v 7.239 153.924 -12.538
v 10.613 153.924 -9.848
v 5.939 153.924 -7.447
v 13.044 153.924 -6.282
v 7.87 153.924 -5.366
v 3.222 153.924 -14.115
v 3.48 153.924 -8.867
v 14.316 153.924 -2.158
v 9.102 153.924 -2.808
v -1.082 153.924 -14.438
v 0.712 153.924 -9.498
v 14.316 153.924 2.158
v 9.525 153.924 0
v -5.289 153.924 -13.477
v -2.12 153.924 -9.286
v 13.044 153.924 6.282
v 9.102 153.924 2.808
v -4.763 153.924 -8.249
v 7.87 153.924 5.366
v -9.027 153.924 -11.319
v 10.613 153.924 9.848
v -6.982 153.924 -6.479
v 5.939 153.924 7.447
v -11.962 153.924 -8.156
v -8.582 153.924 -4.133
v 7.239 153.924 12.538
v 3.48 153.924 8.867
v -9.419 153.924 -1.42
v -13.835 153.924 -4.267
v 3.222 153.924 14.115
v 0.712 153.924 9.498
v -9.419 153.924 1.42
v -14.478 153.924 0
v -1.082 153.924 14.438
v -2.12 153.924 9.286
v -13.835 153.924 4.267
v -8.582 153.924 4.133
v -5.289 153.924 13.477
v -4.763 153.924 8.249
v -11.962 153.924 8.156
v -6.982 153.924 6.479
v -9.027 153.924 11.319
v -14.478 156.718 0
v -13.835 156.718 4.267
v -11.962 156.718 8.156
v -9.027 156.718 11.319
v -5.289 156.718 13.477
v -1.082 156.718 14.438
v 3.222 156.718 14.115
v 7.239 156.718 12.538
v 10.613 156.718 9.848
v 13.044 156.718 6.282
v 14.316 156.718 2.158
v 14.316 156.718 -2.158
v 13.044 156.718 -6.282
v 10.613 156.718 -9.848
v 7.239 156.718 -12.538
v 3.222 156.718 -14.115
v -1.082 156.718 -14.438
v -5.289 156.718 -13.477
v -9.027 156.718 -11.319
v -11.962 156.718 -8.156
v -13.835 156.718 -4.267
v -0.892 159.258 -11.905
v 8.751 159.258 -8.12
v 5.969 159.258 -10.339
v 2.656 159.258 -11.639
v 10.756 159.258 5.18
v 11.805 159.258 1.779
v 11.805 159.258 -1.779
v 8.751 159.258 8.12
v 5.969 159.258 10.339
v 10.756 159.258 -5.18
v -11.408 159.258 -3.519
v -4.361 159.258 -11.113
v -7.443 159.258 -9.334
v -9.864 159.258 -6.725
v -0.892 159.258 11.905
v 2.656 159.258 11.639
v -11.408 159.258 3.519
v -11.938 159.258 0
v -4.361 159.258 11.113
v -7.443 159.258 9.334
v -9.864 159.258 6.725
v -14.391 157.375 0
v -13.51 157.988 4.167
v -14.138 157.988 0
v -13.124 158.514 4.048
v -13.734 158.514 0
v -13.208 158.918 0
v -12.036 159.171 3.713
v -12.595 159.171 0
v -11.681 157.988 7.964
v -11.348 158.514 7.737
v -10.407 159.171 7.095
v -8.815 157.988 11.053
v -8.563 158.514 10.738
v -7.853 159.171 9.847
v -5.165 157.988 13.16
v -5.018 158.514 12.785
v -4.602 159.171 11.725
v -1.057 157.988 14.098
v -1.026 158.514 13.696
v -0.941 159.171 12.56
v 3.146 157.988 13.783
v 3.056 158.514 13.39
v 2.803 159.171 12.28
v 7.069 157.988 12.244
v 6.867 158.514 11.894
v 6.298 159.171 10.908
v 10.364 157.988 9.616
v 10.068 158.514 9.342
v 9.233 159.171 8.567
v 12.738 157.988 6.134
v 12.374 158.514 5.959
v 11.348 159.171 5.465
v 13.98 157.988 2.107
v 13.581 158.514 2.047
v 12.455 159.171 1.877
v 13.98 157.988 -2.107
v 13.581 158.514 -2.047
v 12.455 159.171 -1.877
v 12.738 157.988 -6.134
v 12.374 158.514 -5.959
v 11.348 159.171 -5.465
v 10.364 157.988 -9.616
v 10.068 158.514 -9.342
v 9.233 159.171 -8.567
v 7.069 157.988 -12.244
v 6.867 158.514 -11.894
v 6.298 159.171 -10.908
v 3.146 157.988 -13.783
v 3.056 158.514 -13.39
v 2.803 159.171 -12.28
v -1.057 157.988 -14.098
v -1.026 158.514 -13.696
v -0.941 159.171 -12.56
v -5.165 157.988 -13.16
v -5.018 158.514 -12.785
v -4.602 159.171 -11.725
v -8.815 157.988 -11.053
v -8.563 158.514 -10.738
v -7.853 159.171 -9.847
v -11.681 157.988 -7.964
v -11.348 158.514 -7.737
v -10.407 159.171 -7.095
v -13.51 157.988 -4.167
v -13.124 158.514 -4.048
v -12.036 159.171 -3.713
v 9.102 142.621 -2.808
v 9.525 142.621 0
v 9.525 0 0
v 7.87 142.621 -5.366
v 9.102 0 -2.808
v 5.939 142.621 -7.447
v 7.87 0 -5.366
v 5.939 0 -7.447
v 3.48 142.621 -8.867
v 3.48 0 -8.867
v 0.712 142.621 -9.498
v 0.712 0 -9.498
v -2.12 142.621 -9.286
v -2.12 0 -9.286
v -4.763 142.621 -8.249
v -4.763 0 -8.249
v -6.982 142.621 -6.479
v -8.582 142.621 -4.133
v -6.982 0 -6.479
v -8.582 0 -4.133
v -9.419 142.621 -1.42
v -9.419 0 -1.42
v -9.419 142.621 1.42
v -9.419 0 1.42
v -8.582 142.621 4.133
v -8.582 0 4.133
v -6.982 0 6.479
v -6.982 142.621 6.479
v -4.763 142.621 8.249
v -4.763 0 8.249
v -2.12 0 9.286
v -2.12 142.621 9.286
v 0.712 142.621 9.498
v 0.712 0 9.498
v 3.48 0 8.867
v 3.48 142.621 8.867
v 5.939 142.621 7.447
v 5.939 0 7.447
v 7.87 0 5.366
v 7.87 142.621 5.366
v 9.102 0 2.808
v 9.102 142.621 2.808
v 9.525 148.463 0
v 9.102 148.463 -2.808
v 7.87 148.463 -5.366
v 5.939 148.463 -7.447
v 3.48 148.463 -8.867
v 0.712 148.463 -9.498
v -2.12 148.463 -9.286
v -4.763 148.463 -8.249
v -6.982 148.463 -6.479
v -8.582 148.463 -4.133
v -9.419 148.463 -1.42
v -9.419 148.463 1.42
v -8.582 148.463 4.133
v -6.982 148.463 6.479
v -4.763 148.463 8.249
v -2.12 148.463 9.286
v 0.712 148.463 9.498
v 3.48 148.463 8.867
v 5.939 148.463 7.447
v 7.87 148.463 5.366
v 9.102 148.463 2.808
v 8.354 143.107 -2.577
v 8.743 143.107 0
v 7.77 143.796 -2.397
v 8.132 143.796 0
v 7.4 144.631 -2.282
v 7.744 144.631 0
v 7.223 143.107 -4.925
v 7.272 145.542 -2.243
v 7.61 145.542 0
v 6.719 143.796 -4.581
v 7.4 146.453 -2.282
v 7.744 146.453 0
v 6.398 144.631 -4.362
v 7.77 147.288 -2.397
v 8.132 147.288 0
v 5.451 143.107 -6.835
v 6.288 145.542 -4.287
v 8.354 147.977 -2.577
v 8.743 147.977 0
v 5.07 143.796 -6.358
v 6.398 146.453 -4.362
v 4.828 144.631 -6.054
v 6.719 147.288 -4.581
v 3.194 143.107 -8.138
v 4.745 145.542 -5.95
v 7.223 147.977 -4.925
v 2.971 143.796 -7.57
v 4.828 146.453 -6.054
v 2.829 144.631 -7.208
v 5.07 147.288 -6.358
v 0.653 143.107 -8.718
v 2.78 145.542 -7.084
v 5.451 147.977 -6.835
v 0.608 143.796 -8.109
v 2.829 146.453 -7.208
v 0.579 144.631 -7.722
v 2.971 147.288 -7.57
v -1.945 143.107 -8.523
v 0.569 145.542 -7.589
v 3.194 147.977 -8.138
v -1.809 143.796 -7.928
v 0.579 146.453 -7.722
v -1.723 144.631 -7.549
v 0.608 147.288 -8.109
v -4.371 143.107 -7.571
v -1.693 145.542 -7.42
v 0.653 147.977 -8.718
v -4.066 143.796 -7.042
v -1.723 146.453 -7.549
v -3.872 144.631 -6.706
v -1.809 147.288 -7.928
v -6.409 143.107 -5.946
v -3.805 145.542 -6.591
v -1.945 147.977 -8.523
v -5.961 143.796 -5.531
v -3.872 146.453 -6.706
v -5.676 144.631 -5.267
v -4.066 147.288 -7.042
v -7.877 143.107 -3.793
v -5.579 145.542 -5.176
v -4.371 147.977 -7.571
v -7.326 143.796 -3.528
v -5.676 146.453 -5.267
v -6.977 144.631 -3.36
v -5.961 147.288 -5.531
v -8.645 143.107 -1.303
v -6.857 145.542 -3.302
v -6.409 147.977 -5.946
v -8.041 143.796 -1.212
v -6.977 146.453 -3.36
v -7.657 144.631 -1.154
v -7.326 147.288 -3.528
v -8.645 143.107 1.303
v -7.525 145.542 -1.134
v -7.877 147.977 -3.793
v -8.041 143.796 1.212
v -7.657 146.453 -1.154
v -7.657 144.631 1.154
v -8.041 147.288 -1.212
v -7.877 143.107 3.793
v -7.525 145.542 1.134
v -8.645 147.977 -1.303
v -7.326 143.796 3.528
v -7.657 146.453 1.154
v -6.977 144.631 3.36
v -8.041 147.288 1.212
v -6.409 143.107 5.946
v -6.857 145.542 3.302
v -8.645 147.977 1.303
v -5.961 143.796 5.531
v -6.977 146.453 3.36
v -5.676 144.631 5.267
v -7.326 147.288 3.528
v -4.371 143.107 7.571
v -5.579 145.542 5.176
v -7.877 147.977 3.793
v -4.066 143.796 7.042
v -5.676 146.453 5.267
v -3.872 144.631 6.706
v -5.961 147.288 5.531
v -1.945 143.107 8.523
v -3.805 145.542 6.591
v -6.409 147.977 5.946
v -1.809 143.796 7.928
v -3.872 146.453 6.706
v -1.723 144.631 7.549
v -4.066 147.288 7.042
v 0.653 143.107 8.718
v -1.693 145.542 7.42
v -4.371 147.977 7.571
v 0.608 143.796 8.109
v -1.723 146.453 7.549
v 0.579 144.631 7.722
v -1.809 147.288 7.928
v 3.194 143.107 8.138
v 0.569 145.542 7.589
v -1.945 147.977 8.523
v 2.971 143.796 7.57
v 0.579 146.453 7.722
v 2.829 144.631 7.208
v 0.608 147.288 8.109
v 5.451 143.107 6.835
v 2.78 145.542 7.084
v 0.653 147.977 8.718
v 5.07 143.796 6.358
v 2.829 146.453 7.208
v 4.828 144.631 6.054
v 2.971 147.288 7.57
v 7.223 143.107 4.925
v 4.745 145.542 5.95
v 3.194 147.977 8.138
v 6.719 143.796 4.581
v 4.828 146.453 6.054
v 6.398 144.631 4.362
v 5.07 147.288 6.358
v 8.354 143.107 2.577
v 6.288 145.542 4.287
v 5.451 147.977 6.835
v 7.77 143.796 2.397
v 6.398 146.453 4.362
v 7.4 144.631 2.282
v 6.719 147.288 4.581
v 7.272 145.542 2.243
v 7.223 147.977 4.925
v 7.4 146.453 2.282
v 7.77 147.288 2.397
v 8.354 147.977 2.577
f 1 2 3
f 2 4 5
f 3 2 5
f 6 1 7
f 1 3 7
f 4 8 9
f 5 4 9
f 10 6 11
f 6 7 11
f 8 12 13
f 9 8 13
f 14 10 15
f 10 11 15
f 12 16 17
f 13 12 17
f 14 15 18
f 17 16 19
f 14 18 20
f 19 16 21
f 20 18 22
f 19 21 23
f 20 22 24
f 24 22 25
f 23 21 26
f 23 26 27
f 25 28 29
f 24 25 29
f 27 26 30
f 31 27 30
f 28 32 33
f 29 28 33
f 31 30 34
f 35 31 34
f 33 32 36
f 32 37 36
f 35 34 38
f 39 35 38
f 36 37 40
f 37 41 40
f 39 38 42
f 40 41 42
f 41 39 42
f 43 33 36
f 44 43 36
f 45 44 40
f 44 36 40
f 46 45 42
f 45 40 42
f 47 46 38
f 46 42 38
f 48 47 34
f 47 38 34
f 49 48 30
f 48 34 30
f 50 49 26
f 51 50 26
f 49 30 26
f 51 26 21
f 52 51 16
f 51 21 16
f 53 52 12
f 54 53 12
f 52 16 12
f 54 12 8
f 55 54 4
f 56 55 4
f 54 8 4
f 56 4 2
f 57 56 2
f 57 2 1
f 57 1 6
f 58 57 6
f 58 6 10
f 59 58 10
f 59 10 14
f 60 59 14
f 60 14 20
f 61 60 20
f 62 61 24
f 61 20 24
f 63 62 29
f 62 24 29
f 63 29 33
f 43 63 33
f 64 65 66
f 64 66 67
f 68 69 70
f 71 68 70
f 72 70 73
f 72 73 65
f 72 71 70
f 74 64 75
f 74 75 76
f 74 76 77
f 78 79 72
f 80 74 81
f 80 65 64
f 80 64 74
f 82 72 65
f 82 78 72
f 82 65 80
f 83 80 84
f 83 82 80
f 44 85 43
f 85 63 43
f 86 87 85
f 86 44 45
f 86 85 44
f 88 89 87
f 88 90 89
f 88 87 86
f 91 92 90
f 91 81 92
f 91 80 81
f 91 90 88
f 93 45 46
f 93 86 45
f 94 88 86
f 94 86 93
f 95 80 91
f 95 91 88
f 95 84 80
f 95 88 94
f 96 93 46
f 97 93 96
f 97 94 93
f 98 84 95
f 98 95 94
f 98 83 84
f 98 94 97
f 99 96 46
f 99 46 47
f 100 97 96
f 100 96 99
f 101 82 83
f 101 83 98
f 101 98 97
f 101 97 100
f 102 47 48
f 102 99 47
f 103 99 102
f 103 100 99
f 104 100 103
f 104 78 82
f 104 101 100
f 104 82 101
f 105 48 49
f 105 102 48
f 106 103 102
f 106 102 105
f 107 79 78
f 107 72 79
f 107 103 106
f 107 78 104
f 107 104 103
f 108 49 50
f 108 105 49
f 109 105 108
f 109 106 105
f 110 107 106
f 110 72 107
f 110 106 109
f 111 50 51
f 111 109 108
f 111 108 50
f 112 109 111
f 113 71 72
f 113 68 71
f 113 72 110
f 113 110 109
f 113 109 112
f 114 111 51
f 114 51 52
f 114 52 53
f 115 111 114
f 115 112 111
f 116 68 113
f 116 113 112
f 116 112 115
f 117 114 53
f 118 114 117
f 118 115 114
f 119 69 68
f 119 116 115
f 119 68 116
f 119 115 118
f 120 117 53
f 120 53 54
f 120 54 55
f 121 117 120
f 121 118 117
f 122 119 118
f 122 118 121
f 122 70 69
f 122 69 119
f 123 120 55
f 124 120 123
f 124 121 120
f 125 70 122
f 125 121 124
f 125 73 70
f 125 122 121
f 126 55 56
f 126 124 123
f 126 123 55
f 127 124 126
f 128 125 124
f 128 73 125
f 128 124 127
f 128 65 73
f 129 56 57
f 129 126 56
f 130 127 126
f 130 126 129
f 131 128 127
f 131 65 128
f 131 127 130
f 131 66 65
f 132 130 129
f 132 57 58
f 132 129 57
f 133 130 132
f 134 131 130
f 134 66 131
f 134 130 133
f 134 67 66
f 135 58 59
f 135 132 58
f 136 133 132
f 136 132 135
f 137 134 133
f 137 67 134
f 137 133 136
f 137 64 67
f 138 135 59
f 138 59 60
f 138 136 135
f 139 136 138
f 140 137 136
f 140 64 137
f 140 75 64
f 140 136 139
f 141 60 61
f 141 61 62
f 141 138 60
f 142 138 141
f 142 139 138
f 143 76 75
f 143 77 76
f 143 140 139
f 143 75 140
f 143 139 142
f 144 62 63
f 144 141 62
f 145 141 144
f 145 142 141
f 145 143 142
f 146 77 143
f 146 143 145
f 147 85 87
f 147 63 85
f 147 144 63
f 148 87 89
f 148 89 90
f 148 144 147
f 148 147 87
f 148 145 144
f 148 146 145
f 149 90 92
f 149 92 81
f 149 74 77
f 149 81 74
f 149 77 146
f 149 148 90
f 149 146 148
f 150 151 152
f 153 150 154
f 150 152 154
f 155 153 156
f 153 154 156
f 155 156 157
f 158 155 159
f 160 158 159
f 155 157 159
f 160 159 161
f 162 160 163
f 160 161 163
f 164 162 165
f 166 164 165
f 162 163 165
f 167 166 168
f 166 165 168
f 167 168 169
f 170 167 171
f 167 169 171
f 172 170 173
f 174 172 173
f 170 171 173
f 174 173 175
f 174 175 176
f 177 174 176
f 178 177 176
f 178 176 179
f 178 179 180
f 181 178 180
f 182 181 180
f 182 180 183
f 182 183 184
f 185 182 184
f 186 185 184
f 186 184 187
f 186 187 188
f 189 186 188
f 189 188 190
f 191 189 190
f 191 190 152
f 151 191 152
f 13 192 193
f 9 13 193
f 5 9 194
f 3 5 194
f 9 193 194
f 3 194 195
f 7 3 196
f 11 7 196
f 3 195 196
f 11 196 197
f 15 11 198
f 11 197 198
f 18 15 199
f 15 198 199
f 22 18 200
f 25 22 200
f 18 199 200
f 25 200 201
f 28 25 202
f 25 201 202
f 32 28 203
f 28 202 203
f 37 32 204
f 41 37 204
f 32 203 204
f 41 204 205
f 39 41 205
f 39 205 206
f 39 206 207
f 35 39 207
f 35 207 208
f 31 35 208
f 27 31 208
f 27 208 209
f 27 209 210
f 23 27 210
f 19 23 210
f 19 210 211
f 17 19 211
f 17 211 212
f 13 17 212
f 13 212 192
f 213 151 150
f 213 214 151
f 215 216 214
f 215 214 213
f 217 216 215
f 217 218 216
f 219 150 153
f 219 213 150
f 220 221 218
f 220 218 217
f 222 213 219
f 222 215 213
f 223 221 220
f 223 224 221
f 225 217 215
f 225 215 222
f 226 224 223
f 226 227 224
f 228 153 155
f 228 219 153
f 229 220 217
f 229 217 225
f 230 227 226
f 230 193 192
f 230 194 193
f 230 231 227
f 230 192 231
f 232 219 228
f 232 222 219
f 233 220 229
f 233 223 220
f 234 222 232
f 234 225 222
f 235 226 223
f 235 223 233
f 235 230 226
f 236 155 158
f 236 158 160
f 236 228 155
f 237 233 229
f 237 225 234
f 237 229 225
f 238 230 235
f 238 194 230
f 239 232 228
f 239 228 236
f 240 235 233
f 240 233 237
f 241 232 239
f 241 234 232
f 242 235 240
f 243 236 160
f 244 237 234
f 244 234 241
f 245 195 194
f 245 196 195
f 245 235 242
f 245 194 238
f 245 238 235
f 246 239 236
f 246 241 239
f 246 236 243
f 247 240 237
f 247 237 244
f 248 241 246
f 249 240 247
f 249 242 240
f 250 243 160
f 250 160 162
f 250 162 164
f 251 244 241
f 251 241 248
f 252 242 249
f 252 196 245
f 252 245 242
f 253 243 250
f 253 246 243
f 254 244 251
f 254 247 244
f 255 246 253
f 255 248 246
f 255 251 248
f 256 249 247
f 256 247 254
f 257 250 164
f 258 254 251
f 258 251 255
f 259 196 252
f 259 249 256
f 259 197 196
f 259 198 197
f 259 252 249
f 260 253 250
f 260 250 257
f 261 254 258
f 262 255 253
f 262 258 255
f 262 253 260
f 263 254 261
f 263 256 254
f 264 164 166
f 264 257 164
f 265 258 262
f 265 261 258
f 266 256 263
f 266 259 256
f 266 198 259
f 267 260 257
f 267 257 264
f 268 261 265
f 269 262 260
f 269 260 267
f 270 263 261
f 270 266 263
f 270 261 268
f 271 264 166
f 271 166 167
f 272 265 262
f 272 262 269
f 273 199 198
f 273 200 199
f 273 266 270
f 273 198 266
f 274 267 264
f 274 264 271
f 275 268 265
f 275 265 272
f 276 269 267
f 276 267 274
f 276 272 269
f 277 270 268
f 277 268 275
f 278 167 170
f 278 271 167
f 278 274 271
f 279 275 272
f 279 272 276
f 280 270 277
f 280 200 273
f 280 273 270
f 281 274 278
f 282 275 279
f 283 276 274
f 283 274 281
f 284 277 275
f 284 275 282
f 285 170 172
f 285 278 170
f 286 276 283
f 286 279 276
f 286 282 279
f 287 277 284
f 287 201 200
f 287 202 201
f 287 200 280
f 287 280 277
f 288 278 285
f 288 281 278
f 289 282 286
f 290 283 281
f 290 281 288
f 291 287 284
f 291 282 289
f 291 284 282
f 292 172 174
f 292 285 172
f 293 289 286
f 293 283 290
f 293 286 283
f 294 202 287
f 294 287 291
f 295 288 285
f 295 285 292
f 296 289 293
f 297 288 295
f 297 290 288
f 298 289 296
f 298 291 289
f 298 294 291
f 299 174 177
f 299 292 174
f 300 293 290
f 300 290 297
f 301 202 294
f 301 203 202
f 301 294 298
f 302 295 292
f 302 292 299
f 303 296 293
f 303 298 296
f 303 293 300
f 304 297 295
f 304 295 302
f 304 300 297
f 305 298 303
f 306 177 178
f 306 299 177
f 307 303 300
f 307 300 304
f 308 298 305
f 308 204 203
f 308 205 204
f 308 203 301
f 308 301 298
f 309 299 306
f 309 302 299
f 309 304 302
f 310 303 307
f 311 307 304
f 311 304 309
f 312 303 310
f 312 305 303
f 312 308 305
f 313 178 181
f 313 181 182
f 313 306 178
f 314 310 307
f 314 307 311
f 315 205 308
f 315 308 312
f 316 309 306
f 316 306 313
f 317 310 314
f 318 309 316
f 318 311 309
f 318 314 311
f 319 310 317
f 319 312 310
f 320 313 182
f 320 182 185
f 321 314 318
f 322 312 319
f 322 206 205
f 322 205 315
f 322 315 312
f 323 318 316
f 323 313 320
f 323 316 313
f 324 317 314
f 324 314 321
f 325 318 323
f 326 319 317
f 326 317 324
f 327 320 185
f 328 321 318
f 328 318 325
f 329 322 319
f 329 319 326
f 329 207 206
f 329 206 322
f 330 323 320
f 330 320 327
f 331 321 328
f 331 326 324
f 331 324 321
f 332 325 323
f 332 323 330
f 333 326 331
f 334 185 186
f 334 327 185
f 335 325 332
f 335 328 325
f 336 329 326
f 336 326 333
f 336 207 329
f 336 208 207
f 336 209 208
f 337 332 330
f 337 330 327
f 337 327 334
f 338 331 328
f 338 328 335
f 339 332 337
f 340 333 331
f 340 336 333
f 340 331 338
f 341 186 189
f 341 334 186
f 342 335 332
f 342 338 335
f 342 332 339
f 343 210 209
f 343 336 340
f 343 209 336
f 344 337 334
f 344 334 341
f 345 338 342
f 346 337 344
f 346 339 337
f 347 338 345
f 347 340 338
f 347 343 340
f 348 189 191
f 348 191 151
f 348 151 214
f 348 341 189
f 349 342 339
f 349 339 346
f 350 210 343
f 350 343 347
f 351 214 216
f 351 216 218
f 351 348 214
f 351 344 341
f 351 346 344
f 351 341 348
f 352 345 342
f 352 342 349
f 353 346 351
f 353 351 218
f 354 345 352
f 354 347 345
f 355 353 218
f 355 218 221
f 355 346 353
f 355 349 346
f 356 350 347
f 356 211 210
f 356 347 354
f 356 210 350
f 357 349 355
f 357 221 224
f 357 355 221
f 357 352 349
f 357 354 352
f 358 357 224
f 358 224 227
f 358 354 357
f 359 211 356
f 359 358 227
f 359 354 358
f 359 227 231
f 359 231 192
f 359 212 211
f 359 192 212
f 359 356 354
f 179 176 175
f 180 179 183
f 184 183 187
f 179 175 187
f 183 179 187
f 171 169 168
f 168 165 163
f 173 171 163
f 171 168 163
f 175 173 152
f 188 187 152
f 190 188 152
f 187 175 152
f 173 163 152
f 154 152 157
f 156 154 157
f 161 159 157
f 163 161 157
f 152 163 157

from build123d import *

# Parameters (mm, degrees)
SKETCH2_R      = 9.525
EXTRUDE1_DEPTH = 153.924
SKETCH3_R      = 14.478
EXTRUDE2_DEPTH = 5.334
FILLET1_R      = 2.54


with BuildPart() as part:
    # Sketch2 → Extrude1 (new body)
    with BuildSketch(Plane(origin=(0, 0, 0), x_dir=(1, 0, 0), z_dir=(0, 1, 0))):
        Circle(SKETCH2_R)
    extrude(amount=EXTRUDE1_DEPTH)

    # Sketch3 → Extrude2 (add)
    with BuildSketch(Plane(origin=(0, 153.924, 0), x_dir=(-1, 0, 0), z_dir=(0, 1, 0))):
        Circle(SKETCH3_R)
    extrude(amount=EXTRUDE2_DEPTH)

    # Sketch14 → Cut-Revolve1 (revolve, cut)
    with BuildSketch(Plane.XY):
        with BuildLine():
            Line((9.525, 148.463), (9.525, 142.621))
            ThreePointArc((9.525, 142.621), (7.610493481, 145.542), (9.525, 148.463))
        make_face()
    revolve(axis=Axis((0, 145.542, 0), (0, 1, 0)), mode=Mode.SUBTRACT)

    # Fillet1
    fillet1_edges = [part.edges().sort_by_distance(p)[0] for p in [
        (14.478, 159.258, 0),
    ]]
    fillet(fillet1_edges, radius=FILLET1_R)


solid = part.part
